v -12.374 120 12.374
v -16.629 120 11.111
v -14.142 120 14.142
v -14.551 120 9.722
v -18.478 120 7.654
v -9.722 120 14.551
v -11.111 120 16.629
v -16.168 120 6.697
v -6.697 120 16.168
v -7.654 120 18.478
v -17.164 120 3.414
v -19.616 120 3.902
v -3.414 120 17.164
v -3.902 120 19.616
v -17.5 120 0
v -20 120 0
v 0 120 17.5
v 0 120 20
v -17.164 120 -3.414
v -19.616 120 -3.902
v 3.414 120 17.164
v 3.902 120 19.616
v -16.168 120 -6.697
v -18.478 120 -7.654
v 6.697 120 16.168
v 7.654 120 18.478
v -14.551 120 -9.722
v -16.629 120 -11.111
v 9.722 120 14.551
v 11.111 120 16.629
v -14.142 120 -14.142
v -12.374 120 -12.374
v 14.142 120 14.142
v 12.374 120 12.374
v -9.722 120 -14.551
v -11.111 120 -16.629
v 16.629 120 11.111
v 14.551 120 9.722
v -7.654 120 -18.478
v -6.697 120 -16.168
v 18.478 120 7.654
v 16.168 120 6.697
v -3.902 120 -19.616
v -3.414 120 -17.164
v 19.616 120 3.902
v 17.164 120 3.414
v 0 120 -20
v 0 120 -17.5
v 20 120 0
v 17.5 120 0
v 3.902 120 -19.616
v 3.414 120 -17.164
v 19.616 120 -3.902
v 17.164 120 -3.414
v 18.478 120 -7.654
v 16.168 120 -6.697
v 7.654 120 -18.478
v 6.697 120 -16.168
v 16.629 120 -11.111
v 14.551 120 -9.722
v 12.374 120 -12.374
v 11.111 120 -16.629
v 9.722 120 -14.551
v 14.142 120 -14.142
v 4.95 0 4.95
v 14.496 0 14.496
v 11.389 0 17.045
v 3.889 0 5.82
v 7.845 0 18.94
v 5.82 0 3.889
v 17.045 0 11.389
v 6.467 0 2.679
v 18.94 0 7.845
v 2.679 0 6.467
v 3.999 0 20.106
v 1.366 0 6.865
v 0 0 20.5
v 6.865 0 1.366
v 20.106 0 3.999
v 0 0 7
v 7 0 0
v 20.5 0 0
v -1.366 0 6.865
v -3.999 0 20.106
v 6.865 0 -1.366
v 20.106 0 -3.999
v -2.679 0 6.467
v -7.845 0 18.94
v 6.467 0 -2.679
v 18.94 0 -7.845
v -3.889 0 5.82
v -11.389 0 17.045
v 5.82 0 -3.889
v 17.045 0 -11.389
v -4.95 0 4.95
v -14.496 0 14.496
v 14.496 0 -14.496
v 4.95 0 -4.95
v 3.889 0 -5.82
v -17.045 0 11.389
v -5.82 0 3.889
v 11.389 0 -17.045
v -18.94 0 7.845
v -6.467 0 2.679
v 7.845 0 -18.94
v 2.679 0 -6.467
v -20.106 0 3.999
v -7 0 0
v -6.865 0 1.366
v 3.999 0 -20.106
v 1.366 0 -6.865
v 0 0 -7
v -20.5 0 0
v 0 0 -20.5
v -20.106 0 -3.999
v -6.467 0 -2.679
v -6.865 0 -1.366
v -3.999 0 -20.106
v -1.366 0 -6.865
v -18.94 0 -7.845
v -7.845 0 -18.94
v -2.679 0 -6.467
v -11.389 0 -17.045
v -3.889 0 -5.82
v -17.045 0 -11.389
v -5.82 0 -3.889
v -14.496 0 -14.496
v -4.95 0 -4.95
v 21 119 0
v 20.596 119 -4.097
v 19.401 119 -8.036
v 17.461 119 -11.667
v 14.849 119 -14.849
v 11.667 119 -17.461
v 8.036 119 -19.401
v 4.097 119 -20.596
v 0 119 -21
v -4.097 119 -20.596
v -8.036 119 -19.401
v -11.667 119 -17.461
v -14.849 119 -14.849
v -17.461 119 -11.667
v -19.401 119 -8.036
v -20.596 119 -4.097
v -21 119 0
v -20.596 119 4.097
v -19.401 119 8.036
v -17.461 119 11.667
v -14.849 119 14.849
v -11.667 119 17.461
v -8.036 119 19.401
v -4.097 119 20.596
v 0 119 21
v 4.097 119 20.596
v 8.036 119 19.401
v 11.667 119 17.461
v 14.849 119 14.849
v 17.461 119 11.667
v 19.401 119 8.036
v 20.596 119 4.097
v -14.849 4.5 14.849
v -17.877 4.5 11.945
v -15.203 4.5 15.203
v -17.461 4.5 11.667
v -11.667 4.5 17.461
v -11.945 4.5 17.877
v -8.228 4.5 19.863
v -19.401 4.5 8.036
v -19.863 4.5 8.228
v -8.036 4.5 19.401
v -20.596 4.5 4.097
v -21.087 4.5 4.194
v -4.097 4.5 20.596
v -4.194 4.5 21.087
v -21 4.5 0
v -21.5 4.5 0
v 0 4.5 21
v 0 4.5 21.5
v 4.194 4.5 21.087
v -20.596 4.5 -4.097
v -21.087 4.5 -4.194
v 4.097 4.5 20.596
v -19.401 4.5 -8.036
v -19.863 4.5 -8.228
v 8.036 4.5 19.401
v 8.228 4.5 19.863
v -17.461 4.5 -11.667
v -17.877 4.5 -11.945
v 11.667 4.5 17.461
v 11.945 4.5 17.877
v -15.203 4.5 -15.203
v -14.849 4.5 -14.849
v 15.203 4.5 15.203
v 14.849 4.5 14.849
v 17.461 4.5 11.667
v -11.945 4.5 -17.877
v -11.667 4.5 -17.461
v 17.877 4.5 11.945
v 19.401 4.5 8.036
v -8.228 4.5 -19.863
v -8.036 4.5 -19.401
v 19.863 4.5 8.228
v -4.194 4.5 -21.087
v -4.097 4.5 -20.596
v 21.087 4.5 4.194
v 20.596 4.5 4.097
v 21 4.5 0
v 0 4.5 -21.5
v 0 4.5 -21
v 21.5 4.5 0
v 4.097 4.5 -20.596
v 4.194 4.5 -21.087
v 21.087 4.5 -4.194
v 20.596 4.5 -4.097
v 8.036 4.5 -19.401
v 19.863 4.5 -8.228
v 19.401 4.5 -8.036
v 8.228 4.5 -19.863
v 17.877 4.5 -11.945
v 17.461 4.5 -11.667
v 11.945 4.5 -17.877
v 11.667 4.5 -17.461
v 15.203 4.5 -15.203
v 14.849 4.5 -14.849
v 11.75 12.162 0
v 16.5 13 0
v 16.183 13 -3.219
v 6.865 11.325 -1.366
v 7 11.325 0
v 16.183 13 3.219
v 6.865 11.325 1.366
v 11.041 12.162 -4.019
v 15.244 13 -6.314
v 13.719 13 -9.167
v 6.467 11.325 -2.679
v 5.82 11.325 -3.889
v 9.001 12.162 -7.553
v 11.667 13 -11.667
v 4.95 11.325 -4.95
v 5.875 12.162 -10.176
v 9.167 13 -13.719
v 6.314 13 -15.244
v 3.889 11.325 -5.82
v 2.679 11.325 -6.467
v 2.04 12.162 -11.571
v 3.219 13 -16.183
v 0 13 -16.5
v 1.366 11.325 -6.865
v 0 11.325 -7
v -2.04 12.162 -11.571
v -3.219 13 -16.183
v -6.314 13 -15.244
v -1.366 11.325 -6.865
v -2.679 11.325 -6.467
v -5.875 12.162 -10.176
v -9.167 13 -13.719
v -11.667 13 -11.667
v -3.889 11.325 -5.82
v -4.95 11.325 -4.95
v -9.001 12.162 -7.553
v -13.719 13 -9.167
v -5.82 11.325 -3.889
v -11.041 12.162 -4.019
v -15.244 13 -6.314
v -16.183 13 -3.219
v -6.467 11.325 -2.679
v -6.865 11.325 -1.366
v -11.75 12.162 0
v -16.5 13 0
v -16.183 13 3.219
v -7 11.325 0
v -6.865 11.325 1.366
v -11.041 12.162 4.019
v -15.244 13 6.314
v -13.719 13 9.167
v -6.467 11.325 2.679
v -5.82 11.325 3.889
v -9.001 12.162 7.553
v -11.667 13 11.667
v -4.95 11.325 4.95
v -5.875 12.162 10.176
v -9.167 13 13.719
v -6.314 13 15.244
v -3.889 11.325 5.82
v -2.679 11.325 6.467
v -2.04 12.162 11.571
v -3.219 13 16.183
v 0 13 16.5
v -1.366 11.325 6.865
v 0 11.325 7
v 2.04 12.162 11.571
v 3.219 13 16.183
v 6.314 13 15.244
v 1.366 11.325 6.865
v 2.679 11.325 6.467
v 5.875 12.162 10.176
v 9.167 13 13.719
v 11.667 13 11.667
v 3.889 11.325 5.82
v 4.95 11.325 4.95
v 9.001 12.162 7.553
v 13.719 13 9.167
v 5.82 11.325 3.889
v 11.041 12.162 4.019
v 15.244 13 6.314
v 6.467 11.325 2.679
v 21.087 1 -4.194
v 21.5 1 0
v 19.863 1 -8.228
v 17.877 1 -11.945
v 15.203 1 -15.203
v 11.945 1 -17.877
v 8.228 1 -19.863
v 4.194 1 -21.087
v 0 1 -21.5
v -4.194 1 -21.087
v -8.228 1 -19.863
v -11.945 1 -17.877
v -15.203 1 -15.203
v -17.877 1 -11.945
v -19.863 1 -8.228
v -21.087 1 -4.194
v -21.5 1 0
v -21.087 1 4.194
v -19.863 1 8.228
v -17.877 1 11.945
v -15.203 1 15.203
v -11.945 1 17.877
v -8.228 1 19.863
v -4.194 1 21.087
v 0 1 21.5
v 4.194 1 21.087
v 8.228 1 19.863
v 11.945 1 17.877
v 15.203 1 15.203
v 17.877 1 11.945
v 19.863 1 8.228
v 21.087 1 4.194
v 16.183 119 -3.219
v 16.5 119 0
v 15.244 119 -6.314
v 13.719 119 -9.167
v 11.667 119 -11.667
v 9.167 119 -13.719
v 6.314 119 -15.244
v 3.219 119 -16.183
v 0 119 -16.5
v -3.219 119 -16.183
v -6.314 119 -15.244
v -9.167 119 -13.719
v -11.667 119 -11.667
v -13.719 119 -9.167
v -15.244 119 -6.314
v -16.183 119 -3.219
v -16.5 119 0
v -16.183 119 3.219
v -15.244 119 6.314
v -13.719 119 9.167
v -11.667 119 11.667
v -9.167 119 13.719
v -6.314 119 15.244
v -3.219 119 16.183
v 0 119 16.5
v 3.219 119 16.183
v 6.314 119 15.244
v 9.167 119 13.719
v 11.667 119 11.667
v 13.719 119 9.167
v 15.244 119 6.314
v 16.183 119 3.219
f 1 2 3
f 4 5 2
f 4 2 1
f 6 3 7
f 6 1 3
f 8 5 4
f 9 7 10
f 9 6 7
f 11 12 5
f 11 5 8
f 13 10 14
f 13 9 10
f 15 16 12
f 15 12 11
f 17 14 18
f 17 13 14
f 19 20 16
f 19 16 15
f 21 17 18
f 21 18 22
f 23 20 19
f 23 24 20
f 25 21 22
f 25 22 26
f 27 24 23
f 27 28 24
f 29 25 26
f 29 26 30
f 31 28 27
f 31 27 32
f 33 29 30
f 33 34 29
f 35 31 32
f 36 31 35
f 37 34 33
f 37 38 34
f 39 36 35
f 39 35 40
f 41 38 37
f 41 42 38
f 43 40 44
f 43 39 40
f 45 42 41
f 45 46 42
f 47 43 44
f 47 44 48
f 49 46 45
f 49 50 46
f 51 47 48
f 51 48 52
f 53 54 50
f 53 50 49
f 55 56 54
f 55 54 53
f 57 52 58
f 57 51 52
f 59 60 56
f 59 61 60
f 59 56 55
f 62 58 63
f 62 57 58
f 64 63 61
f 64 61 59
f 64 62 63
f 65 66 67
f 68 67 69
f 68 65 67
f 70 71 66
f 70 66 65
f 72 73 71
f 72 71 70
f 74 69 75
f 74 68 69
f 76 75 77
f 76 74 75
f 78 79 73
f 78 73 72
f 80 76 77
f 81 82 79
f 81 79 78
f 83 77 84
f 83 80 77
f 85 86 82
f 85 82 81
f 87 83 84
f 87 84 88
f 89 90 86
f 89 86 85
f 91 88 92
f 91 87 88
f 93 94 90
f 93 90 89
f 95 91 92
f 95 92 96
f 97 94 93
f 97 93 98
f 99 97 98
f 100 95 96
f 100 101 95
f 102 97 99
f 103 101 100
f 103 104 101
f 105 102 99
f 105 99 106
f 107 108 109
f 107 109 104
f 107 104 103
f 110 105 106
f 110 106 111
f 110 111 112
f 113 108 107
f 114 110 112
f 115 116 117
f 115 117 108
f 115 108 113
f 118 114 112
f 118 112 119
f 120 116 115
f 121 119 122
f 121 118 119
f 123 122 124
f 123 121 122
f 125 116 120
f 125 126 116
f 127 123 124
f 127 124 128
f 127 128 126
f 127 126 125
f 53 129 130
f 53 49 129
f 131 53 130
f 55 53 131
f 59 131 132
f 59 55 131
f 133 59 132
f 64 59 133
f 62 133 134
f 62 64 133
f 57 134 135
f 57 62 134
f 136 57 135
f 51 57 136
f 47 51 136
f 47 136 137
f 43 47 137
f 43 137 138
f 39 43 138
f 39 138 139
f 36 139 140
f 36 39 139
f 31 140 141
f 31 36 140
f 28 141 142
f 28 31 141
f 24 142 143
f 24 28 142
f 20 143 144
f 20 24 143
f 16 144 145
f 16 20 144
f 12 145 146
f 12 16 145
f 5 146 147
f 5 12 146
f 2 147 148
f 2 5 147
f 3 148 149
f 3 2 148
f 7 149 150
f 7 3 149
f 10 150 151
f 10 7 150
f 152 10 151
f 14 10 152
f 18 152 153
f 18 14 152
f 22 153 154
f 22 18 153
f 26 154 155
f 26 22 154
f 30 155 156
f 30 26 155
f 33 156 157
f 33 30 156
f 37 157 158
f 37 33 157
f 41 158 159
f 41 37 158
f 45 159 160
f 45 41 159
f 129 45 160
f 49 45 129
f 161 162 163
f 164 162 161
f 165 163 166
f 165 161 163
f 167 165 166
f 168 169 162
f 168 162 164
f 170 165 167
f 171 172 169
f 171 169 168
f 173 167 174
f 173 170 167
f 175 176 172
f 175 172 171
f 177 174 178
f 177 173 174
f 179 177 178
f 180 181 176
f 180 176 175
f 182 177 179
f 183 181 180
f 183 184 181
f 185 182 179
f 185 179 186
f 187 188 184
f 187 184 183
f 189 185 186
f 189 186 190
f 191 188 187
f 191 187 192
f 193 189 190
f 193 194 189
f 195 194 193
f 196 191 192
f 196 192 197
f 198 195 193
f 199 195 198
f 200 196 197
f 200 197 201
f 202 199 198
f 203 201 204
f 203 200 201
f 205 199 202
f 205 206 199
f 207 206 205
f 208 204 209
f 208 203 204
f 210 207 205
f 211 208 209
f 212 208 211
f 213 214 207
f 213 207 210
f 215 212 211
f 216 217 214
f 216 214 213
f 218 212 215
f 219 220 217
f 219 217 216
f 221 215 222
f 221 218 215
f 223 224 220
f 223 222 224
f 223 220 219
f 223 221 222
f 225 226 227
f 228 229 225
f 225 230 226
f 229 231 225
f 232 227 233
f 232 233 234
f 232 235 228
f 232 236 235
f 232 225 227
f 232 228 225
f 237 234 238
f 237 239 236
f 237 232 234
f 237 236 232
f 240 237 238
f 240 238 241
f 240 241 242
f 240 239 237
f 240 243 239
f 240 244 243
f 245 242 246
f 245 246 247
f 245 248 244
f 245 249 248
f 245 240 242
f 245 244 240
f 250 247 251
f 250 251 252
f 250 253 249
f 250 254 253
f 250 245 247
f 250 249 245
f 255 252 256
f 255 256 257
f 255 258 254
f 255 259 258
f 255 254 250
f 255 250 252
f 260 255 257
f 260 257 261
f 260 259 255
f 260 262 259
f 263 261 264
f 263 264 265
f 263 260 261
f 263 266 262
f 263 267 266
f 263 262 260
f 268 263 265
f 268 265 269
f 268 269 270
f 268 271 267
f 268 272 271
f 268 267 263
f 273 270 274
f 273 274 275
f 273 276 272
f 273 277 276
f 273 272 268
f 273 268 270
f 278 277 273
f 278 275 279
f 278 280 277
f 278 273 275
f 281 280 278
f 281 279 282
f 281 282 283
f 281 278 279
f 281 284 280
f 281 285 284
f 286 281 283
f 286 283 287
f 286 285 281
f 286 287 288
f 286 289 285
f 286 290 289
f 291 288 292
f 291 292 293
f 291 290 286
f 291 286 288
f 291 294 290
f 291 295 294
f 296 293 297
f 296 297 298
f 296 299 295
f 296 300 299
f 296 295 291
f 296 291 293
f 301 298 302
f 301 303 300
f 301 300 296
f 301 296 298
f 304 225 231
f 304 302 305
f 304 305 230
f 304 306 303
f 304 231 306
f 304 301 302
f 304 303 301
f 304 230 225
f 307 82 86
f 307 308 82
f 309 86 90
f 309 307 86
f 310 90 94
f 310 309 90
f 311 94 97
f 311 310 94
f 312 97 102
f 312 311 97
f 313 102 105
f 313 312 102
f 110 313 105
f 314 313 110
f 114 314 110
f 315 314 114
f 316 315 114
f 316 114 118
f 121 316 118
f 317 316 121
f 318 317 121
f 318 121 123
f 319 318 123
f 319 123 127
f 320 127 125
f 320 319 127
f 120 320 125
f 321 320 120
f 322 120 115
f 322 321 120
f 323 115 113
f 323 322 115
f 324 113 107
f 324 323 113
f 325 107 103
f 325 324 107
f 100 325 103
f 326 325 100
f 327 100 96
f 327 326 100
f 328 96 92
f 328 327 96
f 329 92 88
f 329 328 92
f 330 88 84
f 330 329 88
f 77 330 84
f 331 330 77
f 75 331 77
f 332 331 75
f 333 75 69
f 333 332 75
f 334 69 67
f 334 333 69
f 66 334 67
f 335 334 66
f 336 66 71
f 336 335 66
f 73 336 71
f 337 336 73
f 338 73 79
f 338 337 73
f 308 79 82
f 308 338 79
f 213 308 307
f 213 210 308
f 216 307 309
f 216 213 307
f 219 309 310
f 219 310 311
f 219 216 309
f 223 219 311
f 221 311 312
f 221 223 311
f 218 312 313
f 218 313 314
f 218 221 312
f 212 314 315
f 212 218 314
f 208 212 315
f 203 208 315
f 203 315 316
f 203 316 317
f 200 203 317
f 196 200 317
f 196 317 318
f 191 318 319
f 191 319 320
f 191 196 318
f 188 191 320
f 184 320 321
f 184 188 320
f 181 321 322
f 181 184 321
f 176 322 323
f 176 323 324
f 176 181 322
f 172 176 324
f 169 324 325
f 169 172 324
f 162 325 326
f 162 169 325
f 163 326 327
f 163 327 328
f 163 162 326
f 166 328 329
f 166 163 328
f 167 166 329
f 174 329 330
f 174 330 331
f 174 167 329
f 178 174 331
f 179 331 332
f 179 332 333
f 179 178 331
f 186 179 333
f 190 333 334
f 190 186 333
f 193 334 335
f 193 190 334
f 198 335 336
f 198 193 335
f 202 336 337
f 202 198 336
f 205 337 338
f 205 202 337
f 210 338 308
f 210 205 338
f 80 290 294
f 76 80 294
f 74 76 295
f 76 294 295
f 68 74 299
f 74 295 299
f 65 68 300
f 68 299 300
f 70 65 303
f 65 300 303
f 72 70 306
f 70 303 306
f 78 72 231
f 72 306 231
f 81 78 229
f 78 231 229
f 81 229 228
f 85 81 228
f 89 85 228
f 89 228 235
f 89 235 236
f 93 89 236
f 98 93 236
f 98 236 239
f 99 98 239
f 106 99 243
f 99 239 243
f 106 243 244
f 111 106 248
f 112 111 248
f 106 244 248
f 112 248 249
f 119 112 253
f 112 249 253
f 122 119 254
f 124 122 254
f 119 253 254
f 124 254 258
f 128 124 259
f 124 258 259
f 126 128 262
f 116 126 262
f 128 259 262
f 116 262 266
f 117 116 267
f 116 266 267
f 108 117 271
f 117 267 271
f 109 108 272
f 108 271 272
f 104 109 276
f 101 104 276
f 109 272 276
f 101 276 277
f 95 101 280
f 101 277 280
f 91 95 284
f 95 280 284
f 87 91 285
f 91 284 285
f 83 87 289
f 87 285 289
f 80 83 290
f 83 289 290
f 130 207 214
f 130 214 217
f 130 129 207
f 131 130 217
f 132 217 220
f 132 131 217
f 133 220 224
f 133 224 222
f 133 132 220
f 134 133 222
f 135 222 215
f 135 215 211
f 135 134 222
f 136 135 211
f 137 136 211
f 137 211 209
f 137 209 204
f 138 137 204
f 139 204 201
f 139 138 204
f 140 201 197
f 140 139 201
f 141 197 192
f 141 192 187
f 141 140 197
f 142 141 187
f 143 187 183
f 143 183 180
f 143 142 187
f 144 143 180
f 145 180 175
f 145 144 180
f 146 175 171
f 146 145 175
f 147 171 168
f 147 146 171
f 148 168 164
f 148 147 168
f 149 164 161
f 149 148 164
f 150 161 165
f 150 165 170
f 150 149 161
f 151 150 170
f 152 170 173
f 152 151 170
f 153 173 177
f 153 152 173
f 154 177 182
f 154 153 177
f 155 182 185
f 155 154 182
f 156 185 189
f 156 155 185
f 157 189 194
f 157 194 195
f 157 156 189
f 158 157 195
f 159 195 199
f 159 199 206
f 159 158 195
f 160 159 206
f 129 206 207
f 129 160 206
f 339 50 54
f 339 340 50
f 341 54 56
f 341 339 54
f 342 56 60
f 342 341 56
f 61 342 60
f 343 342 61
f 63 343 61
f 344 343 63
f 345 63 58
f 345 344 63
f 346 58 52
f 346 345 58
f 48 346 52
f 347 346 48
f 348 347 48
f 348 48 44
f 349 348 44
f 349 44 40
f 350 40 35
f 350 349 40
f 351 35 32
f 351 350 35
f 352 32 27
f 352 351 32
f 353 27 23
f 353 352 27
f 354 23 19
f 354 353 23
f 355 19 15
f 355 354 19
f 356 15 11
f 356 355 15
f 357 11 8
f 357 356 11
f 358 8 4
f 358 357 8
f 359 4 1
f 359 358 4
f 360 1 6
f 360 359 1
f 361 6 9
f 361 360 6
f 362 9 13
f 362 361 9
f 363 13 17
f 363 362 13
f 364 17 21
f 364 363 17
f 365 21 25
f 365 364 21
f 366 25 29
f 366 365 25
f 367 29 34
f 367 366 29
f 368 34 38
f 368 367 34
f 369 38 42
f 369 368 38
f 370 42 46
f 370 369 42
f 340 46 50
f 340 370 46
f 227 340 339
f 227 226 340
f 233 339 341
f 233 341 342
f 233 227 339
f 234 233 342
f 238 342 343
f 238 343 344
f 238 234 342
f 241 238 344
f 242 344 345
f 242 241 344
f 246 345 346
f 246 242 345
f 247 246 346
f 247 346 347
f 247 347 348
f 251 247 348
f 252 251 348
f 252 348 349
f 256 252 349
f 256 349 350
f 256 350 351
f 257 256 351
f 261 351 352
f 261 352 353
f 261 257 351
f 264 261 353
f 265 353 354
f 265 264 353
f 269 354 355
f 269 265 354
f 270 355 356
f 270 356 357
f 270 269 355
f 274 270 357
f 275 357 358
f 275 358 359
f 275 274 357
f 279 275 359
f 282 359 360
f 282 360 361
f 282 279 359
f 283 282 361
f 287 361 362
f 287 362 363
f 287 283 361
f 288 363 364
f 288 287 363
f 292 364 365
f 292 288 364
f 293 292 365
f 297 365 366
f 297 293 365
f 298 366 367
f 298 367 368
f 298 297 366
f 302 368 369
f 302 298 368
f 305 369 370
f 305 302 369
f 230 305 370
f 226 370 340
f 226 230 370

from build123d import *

# Parameters (mm, degrees)
OTW_R_GWINTOWANY_M161_D = 14


# Read off the part's stored shape, not the designer's step: Obrót1
with BuildPart() as part:
    # Obrót1 outline → Obrót1 (revolve)
    with BuildSketch(Plane.XY):
        Polygon((0, 10.090604818), (0, 0), (20.5, 0), (21.5, 1), (21.5, 4.5), (21, 4.5), (21, 119), (20, 120), (17.5, 120), (16.5, 119), (16.5, 13), align=None)
    revolve(axis=Axis((0, 0, 0), (0, 1, 0)))

    # Otwór gwintowany M161 (through all)
    with Locations(Plane(origin=(0, 0, 0), x_dir=(0, 0, -1), z_dir=(0, -1, 0))):
        with Locations((0, 0)):
            Hole(OTW_R_GWINTOWANY_M161_D / 2)


solid = part.part
